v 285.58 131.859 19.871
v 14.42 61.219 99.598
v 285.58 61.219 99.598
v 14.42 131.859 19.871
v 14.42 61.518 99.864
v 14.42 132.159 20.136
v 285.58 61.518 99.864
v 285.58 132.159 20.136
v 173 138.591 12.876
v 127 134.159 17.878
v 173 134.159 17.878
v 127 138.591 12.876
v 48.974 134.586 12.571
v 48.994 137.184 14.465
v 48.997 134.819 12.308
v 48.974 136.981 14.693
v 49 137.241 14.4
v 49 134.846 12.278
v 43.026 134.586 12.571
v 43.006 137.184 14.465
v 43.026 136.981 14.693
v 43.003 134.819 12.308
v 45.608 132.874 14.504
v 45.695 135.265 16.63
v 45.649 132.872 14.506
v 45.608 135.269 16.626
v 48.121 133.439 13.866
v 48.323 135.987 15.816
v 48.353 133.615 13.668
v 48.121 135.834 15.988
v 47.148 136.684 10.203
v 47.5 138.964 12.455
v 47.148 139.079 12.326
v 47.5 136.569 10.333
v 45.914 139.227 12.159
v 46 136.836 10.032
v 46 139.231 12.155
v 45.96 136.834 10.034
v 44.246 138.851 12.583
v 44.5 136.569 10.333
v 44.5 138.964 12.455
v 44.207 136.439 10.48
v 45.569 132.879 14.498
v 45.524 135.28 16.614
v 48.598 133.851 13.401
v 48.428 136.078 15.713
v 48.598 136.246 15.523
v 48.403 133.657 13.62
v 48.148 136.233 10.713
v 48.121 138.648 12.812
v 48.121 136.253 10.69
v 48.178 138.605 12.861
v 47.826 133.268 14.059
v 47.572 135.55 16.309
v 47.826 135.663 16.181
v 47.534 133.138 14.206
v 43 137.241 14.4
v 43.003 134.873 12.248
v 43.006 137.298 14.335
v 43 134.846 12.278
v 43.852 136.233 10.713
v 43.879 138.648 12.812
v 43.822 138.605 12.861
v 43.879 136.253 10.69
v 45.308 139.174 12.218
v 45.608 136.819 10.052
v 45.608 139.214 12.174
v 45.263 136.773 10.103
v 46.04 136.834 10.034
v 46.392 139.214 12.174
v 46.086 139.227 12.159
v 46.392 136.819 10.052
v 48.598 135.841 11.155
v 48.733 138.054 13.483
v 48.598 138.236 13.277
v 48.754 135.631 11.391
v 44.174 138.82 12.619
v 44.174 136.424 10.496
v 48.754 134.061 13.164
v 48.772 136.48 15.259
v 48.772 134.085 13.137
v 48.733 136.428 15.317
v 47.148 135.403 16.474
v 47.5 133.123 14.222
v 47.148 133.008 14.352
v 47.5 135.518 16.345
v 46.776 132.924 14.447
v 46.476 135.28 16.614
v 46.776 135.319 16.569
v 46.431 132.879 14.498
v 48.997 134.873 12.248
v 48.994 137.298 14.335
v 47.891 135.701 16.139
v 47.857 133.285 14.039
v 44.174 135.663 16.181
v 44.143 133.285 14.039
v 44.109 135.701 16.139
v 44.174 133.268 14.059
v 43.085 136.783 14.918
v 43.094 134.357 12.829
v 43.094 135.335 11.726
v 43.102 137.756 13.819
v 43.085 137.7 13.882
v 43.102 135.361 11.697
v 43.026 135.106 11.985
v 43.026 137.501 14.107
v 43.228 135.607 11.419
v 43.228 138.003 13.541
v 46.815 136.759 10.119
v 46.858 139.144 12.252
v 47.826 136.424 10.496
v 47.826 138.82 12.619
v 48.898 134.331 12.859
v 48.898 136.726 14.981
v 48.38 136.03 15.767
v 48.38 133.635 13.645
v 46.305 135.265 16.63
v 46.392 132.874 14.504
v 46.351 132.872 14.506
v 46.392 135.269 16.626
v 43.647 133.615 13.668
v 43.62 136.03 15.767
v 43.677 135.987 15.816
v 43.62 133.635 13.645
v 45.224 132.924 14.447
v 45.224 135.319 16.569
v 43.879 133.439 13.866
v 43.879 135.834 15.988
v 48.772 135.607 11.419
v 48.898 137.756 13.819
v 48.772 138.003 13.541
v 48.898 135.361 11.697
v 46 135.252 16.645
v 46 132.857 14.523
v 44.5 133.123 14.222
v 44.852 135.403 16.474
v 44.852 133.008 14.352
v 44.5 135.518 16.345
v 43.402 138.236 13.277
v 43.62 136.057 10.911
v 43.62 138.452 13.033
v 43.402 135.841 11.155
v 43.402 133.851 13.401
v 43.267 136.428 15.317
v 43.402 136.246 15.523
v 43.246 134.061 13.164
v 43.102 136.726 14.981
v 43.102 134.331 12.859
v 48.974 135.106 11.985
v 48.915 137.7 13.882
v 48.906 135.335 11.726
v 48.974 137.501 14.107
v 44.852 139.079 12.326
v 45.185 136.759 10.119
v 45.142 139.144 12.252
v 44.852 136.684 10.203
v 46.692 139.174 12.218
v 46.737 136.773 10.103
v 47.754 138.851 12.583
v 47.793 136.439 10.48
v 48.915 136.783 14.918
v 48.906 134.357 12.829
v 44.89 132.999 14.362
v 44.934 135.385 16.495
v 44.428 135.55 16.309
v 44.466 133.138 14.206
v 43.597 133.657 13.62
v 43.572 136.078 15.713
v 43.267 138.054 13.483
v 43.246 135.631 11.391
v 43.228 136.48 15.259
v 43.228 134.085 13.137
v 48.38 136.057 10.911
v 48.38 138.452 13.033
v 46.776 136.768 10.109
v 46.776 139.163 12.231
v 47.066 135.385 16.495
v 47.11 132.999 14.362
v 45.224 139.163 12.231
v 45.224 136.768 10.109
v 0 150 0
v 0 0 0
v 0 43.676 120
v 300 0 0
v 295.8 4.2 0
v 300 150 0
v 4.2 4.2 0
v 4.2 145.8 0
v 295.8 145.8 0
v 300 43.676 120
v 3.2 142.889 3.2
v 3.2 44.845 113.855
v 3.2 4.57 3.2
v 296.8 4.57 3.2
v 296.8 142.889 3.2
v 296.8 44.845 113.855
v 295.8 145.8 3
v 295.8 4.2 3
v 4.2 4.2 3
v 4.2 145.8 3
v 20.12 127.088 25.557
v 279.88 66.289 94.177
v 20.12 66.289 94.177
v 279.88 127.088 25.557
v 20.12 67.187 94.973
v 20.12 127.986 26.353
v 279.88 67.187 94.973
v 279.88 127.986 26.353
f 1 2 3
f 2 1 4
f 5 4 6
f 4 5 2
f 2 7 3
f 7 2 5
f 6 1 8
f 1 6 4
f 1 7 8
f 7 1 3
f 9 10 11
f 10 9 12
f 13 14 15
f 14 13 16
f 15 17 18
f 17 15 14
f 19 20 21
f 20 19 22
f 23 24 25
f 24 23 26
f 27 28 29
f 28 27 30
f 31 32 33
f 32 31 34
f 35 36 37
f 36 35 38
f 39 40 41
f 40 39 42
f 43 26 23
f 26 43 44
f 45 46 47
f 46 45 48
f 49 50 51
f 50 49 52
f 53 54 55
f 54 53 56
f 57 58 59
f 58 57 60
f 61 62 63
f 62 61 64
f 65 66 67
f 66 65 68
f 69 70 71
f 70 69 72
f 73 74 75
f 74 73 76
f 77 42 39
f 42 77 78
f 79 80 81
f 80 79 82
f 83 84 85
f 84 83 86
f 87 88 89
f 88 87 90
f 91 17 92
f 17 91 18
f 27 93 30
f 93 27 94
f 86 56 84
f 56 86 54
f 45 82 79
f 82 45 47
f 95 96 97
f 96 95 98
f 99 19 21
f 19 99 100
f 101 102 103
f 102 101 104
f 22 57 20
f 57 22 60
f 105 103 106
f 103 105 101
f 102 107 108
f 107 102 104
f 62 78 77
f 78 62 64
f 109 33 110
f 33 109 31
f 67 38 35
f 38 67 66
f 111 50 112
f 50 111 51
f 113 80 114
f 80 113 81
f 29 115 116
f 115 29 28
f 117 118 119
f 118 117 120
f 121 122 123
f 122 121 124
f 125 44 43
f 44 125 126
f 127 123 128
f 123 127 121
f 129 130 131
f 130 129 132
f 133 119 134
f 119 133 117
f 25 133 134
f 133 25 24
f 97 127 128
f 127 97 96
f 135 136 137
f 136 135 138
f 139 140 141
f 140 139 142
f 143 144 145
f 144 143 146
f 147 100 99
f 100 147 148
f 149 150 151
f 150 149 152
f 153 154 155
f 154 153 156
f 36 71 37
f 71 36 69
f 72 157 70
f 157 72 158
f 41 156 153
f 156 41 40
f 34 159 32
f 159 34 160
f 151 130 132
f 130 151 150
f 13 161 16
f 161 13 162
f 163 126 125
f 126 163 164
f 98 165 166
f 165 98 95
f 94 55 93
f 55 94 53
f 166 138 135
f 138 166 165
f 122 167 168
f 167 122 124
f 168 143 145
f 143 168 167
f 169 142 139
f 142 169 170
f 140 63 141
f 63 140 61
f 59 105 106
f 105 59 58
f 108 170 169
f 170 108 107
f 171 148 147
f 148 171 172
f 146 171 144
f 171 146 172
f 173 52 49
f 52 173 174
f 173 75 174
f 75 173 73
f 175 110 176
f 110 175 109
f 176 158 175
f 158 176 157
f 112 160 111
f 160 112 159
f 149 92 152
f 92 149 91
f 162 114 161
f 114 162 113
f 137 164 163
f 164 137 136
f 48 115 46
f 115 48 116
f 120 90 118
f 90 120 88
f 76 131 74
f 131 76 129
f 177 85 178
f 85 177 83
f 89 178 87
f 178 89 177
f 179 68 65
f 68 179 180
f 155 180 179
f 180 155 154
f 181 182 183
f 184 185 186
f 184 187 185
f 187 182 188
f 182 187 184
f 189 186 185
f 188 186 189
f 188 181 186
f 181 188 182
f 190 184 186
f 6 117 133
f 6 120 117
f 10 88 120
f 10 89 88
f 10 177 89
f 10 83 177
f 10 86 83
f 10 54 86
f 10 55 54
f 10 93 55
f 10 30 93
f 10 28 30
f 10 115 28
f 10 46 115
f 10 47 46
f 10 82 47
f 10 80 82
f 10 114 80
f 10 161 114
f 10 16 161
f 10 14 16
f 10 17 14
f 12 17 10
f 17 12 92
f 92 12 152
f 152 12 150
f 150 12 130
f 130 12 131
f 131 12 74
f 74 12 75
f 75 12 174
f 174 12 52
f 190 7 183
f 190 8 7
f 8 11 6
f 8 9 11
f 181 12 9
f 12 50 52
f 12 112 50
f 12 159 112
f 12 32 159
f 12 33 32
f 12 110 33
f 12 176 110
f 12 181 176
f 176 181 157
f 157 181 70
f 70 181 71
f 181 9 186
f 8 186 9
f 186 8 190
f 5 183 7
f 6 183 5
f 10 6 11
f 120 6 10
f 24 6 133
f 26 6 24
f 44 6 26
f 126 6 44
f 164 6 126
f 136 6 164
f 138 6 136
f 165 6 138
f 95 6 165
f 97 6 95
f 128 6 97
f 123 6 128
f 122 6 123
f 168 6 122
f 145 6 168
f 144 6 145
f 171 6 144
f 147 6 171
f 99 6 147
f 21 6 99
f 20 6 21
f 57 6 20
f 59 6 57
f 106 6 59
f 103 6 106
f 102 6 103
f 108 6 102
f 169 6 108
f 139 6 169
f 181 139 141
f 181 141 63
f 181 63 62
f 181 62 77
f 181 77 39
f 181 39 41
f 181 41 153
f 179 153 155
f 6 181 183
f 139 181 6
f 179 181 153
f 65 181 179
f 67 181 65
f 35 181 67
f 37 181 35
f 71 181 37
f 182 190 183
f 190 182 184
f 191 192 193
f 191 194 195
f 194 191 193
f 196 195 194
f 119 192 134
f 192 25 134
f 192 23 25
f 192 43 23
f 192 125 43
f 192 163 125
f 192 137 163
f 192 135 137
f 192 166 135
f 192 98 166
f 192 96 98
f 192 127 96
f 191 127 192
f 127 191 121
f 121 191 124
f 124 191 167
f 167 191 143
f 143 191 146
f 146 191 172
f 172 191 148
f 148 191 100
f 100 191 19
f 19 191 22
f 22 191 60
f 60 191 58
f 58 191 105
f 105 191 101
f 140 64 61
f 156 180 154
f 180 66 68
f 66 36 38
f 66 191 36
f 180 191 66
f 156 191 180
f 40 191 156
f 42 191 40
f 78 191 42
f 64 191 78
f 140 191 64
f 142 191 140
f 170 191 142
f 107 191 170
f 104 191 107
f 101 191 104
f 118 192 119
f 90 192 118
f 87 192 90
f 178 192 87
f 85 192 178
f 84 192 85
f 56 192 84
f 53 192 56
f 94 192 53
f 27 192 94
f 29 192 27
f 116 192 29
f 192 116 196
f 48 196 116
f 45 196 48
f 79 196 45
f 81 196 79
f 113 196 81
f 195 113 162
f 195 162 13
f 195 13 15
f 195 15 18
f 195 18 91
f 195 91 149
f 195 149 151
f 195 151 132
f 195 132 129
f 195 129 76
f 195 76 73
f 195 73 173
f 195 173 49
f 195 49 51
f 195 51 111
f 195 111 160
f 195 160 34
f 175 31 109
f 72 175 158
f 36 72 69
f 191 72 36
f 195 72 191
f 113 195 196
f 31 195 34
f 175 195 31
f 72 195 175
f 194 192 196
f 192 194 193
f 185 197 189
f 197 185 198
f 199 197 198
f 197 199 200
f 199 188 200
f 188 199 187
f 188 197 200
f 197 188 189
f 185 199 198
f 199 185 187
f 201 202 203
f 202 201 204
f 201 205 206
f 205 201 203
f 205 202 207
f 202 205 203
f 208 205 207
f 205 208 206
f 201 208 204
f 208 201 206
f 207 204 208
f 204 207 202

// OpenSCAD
// ===========================================================================
// Almanac Stone -- prototype enclosure ("Toblerone" triangular prism)
// Parametric OpenSCAD. Units: millimetres.
//
// Built around the Waveshare 10.85" e-Paper HAT+ (G):
//   panel outline  270.56 x 105.92 x 1.20 mm ; active 259.76 x 91.68 mm
//   SPI 4-colour (R/Y/B/W) ; driver HAT 65.0 x 30.5 mm
//
// Cross-section is a right-angled triangle in Y-Z, extruded along X (width).
//   - vertical BACK wall (at y=0)
//   - horizontal BASE  (at z=0)
//   - sloped FRONT face carrying the screen, tilted `front_tilt` from vertical
// The screen lies on the sloped front face; a crystal well sits front-left.
//
// part = "assembly" | "left" | "right" | "base" | "bezel"
// The body is ~300 mm wide so it prints in LEFT + RIGHT halves (seam at X mid),
// with a screwed-on BASE plate for electronics access and a snap BEZEL.
// ===========================================================================

/* [Render] */
part = "assembly"; // [assembly, left, right, base, bezel]

/* [Panel: Waveshare 10.85 (G)] */
panel_w   = 270.56;   // outline width  (X on the face)
panel_h   = 105.92;   // outline height (up the slope)
panel_t   = 1.20;     // glass thickness
active_w  = 259.76;
active_h  = 91.68;

/* [Body] */
body_width = 300;     // X length of the prism
depth      = 150;     // Y footprint (base)
height     = 120;     // Z height of the back wall
front_tilt = 20;      // front face lean from vertical (deg); 0 = vertical screen
wall       = 3.2;

/* [Screen window] */
bezel_overlap = 4;    // bezel covers this much of active edge
face_up_frac  = 0.50; // centre of screen along the slope (0 base .. 1 apex)

/* [Crystal well] */
// The screen fills most of the face width, so the crystal well sits LOW on the
// front face, below the screen window, front-left (as in the product render).
crystal_w    = 26;
crystal_h    = 40;
crystal_deep = 18;
crystal_from_left = 46;   // from the left edge of the face to the well centre
crystal_up_frac   = 0.12; // low on the slope, clear of the screen
led_hole     = 6;

/* [Assembly] */
dowel_d = 4.2;
dowels  = 3;
screw_d = 3.4;
tol     = 0.30;

/* [Quality] */
$fn = 48;
eps = 0.02;

// ---------------------------------------------------------------------------
// Cross-section triangle (Y-Z). Back wall vertical at y=0.
//   A = (0,0)         base-back corner
//   B = (depth,0)     base-front corner
//   C = (0,height)    top of back wall
// The FRONT face is the hypotenuse B->C. Its lean from vertical:
//   we tilt by shifting C forward by height*tan(front_tilt).
// ---------------------------------------------------------------------------
Cx = height * tan(front_tilt);
tri = [[0,0],[depth,0],[Cx,height]];

// Front face geometry (segment B=(depth,0) -> C=(Cx,height))
face_dy = Cx - depth;
face_dz = height;
face_len = sqrt(face_dy*face_dy + face_dz*face_dz);
face_ang = atan2(face_dz, face_dy);   // angle of face direction from +Y axis

module solid_prism(w) {
    rotate([90,0,90]) linear_extrude(height=w) polygon(tri);
}

// Inner cavity: same triangle scaled down by wall on each side (simple offset).
module inner_prism(w) {
    // offset() shrinks the 2D triangle uniformly by `wall`.
    translate([wall, 0, 0])
        rotate([90,0,90]) linear_extrude(height = w - 2*wall)
            offset(delta = -wall) polygon(tri);
}

// Place children onto the FRONT face.
//   u = distance along the slope from corner B (0..face_len)
//   x = position along width from body centre
//   into = depth into the body (negative goes inward)
// After the transform, child's +Z points OUT of the face (normal), local X is
// width, local Y runs up the slope.
module on_face(u, x=0, into=0) {
    // Point on the face in Y-Z:
    py = depth + (face_dy/face_len)*u;
    pz = (face_dz/face_len)*u;
    translate([body_width/2 + x, py, pz])
        // rotate local +Z to the outward face normal.
        // Face normal points up-and-forward: normal angle = face_ang - 90 in Y-Z.
        rotate([face_ang, 0, 0])       // tilt so local Y follows the slope
            rotate([0,0,0])
                translate([0,0,into])
                    children();
}

// ---------------------------------------------------------------------------
// Cutouts
// ---------------------------------------------------------------------------
module screen_cut() {
    u = face_len * face_up_frac;
    win_w = active_w - 2*bezel_overlap;
    win_h = active_h - 2*bezel_overlap;
    // through window
    on_face(u, 0, -50) cube([win_w, win_h, 100], center=true);
    // panel glass rebate (from the outside)
    on_face(u, 0, -panel_t) cube([panel_w+2*tol, panel_h+2*tol, panel_t+2], center=true);
    // FPC slot at the lower edge of the panel, into the body
    on_face(u - panel_h/2 - 2, 0, -40) cube([46, 16, 80], center=true);
}

module crystal_cut() {
    u = face_len * crystal_up_frac;
    xoff = -(body_width/2) + crystal_from_left;
    on_face(u, xoff, -crystal_deep) {
        // rounded well
        minkowski() { cube([crystal_w-6, crystal_h-6, crystal_deep], center=true); cylinder(r=3,h=eps); }
    }
    // light hole from well to interior
    on_face(u, xoff, -crystal_deep-wall) cylinder(d=led_hole, h=crystal_deep+wall+6);
}

module dowel_holes() {
    for (i=[0:dowels-1]) {
        yy = depth*(i+1)/(dowels+1);
        // hole runs along X through the seam plane
        translate([body_width/2, yy, height*0.18])
            rotate([0,90,0]) cylinder(d=dowel_d, h=60, center=true);
    }
}

module base_pocket() {
    // rebate for the screwed-on base plate
    translate([wall+1, wall+1, -eps])
        cube([body_width-2*wall-2, depth-2*wall-2, 3+eps]);
}

// ---------------------------------------------------------------------------
// Body
// ---------------------------------------------------------------------------
module body() {
    difference() {
        solid_prism(body_width);
        inner_prism(body_width);
        screen_cut();
        crystal_cut();
        base_pocket();
        dowel_holes();
    }
}

module left_half()  { intersection() { body(); translate([-1,-10,-10]) cube([body_width/2+1, depth+20, height+20]); } }
module right_half() { intersection() { body(); translate([body_width/2,-10,-10]) cube([body_width/2+1, depth+20, height+20]); } }

module base_plate() {
    bw = depth-2*wall-2;  bl = body_width-2*wall-2;
    difference() {
        cube([bl, bw, 3]);
        for (x=[10, bl-10], y=[10, bw-10]) translate([x,y,-eps]) cylinder(d=screw_d, h=6);
        for (i=[0:5]) translate([40+i*35, bw/2-15, -eps]) cube([6,30,6]); // vents
    }
}

module bezel() {
    win_w = active_w - 2*bezel_overlap;
    win_h = active_h - 2*bezel_overlap;
    outer_w = panel_w + 12;  outer_h = panel_h + 12;
    difference() {
        cube([outer_w, outer_h, 3.6], center=true);
        translate([0,0,-1])   cube([win_w, win_h, 8], center=true);              // opening
        translate([0,0,1.7])  cube([panel_w+2*tol, panel_h+2*tol, 3], center=true); // glass rebate
    }
}

// ---------------------------------------------------------------------------
// Selector
// ---------------------------------------------------------------------------
if      (part=="assembly") {
    color([0.17,0.16,0.20]) body();
    u = face_len*face_up_frac;
    color([0.05,0.05,0.05,0.8]) on_face(u, 0, -0.4) cube([active_w, active_h, 1.2], center=true);
}
else if (part=="left")  left_half();
else if (part=="right") right_half();
else if (part=="base")  base_plate();
else if (part=="bezel") bezel();
